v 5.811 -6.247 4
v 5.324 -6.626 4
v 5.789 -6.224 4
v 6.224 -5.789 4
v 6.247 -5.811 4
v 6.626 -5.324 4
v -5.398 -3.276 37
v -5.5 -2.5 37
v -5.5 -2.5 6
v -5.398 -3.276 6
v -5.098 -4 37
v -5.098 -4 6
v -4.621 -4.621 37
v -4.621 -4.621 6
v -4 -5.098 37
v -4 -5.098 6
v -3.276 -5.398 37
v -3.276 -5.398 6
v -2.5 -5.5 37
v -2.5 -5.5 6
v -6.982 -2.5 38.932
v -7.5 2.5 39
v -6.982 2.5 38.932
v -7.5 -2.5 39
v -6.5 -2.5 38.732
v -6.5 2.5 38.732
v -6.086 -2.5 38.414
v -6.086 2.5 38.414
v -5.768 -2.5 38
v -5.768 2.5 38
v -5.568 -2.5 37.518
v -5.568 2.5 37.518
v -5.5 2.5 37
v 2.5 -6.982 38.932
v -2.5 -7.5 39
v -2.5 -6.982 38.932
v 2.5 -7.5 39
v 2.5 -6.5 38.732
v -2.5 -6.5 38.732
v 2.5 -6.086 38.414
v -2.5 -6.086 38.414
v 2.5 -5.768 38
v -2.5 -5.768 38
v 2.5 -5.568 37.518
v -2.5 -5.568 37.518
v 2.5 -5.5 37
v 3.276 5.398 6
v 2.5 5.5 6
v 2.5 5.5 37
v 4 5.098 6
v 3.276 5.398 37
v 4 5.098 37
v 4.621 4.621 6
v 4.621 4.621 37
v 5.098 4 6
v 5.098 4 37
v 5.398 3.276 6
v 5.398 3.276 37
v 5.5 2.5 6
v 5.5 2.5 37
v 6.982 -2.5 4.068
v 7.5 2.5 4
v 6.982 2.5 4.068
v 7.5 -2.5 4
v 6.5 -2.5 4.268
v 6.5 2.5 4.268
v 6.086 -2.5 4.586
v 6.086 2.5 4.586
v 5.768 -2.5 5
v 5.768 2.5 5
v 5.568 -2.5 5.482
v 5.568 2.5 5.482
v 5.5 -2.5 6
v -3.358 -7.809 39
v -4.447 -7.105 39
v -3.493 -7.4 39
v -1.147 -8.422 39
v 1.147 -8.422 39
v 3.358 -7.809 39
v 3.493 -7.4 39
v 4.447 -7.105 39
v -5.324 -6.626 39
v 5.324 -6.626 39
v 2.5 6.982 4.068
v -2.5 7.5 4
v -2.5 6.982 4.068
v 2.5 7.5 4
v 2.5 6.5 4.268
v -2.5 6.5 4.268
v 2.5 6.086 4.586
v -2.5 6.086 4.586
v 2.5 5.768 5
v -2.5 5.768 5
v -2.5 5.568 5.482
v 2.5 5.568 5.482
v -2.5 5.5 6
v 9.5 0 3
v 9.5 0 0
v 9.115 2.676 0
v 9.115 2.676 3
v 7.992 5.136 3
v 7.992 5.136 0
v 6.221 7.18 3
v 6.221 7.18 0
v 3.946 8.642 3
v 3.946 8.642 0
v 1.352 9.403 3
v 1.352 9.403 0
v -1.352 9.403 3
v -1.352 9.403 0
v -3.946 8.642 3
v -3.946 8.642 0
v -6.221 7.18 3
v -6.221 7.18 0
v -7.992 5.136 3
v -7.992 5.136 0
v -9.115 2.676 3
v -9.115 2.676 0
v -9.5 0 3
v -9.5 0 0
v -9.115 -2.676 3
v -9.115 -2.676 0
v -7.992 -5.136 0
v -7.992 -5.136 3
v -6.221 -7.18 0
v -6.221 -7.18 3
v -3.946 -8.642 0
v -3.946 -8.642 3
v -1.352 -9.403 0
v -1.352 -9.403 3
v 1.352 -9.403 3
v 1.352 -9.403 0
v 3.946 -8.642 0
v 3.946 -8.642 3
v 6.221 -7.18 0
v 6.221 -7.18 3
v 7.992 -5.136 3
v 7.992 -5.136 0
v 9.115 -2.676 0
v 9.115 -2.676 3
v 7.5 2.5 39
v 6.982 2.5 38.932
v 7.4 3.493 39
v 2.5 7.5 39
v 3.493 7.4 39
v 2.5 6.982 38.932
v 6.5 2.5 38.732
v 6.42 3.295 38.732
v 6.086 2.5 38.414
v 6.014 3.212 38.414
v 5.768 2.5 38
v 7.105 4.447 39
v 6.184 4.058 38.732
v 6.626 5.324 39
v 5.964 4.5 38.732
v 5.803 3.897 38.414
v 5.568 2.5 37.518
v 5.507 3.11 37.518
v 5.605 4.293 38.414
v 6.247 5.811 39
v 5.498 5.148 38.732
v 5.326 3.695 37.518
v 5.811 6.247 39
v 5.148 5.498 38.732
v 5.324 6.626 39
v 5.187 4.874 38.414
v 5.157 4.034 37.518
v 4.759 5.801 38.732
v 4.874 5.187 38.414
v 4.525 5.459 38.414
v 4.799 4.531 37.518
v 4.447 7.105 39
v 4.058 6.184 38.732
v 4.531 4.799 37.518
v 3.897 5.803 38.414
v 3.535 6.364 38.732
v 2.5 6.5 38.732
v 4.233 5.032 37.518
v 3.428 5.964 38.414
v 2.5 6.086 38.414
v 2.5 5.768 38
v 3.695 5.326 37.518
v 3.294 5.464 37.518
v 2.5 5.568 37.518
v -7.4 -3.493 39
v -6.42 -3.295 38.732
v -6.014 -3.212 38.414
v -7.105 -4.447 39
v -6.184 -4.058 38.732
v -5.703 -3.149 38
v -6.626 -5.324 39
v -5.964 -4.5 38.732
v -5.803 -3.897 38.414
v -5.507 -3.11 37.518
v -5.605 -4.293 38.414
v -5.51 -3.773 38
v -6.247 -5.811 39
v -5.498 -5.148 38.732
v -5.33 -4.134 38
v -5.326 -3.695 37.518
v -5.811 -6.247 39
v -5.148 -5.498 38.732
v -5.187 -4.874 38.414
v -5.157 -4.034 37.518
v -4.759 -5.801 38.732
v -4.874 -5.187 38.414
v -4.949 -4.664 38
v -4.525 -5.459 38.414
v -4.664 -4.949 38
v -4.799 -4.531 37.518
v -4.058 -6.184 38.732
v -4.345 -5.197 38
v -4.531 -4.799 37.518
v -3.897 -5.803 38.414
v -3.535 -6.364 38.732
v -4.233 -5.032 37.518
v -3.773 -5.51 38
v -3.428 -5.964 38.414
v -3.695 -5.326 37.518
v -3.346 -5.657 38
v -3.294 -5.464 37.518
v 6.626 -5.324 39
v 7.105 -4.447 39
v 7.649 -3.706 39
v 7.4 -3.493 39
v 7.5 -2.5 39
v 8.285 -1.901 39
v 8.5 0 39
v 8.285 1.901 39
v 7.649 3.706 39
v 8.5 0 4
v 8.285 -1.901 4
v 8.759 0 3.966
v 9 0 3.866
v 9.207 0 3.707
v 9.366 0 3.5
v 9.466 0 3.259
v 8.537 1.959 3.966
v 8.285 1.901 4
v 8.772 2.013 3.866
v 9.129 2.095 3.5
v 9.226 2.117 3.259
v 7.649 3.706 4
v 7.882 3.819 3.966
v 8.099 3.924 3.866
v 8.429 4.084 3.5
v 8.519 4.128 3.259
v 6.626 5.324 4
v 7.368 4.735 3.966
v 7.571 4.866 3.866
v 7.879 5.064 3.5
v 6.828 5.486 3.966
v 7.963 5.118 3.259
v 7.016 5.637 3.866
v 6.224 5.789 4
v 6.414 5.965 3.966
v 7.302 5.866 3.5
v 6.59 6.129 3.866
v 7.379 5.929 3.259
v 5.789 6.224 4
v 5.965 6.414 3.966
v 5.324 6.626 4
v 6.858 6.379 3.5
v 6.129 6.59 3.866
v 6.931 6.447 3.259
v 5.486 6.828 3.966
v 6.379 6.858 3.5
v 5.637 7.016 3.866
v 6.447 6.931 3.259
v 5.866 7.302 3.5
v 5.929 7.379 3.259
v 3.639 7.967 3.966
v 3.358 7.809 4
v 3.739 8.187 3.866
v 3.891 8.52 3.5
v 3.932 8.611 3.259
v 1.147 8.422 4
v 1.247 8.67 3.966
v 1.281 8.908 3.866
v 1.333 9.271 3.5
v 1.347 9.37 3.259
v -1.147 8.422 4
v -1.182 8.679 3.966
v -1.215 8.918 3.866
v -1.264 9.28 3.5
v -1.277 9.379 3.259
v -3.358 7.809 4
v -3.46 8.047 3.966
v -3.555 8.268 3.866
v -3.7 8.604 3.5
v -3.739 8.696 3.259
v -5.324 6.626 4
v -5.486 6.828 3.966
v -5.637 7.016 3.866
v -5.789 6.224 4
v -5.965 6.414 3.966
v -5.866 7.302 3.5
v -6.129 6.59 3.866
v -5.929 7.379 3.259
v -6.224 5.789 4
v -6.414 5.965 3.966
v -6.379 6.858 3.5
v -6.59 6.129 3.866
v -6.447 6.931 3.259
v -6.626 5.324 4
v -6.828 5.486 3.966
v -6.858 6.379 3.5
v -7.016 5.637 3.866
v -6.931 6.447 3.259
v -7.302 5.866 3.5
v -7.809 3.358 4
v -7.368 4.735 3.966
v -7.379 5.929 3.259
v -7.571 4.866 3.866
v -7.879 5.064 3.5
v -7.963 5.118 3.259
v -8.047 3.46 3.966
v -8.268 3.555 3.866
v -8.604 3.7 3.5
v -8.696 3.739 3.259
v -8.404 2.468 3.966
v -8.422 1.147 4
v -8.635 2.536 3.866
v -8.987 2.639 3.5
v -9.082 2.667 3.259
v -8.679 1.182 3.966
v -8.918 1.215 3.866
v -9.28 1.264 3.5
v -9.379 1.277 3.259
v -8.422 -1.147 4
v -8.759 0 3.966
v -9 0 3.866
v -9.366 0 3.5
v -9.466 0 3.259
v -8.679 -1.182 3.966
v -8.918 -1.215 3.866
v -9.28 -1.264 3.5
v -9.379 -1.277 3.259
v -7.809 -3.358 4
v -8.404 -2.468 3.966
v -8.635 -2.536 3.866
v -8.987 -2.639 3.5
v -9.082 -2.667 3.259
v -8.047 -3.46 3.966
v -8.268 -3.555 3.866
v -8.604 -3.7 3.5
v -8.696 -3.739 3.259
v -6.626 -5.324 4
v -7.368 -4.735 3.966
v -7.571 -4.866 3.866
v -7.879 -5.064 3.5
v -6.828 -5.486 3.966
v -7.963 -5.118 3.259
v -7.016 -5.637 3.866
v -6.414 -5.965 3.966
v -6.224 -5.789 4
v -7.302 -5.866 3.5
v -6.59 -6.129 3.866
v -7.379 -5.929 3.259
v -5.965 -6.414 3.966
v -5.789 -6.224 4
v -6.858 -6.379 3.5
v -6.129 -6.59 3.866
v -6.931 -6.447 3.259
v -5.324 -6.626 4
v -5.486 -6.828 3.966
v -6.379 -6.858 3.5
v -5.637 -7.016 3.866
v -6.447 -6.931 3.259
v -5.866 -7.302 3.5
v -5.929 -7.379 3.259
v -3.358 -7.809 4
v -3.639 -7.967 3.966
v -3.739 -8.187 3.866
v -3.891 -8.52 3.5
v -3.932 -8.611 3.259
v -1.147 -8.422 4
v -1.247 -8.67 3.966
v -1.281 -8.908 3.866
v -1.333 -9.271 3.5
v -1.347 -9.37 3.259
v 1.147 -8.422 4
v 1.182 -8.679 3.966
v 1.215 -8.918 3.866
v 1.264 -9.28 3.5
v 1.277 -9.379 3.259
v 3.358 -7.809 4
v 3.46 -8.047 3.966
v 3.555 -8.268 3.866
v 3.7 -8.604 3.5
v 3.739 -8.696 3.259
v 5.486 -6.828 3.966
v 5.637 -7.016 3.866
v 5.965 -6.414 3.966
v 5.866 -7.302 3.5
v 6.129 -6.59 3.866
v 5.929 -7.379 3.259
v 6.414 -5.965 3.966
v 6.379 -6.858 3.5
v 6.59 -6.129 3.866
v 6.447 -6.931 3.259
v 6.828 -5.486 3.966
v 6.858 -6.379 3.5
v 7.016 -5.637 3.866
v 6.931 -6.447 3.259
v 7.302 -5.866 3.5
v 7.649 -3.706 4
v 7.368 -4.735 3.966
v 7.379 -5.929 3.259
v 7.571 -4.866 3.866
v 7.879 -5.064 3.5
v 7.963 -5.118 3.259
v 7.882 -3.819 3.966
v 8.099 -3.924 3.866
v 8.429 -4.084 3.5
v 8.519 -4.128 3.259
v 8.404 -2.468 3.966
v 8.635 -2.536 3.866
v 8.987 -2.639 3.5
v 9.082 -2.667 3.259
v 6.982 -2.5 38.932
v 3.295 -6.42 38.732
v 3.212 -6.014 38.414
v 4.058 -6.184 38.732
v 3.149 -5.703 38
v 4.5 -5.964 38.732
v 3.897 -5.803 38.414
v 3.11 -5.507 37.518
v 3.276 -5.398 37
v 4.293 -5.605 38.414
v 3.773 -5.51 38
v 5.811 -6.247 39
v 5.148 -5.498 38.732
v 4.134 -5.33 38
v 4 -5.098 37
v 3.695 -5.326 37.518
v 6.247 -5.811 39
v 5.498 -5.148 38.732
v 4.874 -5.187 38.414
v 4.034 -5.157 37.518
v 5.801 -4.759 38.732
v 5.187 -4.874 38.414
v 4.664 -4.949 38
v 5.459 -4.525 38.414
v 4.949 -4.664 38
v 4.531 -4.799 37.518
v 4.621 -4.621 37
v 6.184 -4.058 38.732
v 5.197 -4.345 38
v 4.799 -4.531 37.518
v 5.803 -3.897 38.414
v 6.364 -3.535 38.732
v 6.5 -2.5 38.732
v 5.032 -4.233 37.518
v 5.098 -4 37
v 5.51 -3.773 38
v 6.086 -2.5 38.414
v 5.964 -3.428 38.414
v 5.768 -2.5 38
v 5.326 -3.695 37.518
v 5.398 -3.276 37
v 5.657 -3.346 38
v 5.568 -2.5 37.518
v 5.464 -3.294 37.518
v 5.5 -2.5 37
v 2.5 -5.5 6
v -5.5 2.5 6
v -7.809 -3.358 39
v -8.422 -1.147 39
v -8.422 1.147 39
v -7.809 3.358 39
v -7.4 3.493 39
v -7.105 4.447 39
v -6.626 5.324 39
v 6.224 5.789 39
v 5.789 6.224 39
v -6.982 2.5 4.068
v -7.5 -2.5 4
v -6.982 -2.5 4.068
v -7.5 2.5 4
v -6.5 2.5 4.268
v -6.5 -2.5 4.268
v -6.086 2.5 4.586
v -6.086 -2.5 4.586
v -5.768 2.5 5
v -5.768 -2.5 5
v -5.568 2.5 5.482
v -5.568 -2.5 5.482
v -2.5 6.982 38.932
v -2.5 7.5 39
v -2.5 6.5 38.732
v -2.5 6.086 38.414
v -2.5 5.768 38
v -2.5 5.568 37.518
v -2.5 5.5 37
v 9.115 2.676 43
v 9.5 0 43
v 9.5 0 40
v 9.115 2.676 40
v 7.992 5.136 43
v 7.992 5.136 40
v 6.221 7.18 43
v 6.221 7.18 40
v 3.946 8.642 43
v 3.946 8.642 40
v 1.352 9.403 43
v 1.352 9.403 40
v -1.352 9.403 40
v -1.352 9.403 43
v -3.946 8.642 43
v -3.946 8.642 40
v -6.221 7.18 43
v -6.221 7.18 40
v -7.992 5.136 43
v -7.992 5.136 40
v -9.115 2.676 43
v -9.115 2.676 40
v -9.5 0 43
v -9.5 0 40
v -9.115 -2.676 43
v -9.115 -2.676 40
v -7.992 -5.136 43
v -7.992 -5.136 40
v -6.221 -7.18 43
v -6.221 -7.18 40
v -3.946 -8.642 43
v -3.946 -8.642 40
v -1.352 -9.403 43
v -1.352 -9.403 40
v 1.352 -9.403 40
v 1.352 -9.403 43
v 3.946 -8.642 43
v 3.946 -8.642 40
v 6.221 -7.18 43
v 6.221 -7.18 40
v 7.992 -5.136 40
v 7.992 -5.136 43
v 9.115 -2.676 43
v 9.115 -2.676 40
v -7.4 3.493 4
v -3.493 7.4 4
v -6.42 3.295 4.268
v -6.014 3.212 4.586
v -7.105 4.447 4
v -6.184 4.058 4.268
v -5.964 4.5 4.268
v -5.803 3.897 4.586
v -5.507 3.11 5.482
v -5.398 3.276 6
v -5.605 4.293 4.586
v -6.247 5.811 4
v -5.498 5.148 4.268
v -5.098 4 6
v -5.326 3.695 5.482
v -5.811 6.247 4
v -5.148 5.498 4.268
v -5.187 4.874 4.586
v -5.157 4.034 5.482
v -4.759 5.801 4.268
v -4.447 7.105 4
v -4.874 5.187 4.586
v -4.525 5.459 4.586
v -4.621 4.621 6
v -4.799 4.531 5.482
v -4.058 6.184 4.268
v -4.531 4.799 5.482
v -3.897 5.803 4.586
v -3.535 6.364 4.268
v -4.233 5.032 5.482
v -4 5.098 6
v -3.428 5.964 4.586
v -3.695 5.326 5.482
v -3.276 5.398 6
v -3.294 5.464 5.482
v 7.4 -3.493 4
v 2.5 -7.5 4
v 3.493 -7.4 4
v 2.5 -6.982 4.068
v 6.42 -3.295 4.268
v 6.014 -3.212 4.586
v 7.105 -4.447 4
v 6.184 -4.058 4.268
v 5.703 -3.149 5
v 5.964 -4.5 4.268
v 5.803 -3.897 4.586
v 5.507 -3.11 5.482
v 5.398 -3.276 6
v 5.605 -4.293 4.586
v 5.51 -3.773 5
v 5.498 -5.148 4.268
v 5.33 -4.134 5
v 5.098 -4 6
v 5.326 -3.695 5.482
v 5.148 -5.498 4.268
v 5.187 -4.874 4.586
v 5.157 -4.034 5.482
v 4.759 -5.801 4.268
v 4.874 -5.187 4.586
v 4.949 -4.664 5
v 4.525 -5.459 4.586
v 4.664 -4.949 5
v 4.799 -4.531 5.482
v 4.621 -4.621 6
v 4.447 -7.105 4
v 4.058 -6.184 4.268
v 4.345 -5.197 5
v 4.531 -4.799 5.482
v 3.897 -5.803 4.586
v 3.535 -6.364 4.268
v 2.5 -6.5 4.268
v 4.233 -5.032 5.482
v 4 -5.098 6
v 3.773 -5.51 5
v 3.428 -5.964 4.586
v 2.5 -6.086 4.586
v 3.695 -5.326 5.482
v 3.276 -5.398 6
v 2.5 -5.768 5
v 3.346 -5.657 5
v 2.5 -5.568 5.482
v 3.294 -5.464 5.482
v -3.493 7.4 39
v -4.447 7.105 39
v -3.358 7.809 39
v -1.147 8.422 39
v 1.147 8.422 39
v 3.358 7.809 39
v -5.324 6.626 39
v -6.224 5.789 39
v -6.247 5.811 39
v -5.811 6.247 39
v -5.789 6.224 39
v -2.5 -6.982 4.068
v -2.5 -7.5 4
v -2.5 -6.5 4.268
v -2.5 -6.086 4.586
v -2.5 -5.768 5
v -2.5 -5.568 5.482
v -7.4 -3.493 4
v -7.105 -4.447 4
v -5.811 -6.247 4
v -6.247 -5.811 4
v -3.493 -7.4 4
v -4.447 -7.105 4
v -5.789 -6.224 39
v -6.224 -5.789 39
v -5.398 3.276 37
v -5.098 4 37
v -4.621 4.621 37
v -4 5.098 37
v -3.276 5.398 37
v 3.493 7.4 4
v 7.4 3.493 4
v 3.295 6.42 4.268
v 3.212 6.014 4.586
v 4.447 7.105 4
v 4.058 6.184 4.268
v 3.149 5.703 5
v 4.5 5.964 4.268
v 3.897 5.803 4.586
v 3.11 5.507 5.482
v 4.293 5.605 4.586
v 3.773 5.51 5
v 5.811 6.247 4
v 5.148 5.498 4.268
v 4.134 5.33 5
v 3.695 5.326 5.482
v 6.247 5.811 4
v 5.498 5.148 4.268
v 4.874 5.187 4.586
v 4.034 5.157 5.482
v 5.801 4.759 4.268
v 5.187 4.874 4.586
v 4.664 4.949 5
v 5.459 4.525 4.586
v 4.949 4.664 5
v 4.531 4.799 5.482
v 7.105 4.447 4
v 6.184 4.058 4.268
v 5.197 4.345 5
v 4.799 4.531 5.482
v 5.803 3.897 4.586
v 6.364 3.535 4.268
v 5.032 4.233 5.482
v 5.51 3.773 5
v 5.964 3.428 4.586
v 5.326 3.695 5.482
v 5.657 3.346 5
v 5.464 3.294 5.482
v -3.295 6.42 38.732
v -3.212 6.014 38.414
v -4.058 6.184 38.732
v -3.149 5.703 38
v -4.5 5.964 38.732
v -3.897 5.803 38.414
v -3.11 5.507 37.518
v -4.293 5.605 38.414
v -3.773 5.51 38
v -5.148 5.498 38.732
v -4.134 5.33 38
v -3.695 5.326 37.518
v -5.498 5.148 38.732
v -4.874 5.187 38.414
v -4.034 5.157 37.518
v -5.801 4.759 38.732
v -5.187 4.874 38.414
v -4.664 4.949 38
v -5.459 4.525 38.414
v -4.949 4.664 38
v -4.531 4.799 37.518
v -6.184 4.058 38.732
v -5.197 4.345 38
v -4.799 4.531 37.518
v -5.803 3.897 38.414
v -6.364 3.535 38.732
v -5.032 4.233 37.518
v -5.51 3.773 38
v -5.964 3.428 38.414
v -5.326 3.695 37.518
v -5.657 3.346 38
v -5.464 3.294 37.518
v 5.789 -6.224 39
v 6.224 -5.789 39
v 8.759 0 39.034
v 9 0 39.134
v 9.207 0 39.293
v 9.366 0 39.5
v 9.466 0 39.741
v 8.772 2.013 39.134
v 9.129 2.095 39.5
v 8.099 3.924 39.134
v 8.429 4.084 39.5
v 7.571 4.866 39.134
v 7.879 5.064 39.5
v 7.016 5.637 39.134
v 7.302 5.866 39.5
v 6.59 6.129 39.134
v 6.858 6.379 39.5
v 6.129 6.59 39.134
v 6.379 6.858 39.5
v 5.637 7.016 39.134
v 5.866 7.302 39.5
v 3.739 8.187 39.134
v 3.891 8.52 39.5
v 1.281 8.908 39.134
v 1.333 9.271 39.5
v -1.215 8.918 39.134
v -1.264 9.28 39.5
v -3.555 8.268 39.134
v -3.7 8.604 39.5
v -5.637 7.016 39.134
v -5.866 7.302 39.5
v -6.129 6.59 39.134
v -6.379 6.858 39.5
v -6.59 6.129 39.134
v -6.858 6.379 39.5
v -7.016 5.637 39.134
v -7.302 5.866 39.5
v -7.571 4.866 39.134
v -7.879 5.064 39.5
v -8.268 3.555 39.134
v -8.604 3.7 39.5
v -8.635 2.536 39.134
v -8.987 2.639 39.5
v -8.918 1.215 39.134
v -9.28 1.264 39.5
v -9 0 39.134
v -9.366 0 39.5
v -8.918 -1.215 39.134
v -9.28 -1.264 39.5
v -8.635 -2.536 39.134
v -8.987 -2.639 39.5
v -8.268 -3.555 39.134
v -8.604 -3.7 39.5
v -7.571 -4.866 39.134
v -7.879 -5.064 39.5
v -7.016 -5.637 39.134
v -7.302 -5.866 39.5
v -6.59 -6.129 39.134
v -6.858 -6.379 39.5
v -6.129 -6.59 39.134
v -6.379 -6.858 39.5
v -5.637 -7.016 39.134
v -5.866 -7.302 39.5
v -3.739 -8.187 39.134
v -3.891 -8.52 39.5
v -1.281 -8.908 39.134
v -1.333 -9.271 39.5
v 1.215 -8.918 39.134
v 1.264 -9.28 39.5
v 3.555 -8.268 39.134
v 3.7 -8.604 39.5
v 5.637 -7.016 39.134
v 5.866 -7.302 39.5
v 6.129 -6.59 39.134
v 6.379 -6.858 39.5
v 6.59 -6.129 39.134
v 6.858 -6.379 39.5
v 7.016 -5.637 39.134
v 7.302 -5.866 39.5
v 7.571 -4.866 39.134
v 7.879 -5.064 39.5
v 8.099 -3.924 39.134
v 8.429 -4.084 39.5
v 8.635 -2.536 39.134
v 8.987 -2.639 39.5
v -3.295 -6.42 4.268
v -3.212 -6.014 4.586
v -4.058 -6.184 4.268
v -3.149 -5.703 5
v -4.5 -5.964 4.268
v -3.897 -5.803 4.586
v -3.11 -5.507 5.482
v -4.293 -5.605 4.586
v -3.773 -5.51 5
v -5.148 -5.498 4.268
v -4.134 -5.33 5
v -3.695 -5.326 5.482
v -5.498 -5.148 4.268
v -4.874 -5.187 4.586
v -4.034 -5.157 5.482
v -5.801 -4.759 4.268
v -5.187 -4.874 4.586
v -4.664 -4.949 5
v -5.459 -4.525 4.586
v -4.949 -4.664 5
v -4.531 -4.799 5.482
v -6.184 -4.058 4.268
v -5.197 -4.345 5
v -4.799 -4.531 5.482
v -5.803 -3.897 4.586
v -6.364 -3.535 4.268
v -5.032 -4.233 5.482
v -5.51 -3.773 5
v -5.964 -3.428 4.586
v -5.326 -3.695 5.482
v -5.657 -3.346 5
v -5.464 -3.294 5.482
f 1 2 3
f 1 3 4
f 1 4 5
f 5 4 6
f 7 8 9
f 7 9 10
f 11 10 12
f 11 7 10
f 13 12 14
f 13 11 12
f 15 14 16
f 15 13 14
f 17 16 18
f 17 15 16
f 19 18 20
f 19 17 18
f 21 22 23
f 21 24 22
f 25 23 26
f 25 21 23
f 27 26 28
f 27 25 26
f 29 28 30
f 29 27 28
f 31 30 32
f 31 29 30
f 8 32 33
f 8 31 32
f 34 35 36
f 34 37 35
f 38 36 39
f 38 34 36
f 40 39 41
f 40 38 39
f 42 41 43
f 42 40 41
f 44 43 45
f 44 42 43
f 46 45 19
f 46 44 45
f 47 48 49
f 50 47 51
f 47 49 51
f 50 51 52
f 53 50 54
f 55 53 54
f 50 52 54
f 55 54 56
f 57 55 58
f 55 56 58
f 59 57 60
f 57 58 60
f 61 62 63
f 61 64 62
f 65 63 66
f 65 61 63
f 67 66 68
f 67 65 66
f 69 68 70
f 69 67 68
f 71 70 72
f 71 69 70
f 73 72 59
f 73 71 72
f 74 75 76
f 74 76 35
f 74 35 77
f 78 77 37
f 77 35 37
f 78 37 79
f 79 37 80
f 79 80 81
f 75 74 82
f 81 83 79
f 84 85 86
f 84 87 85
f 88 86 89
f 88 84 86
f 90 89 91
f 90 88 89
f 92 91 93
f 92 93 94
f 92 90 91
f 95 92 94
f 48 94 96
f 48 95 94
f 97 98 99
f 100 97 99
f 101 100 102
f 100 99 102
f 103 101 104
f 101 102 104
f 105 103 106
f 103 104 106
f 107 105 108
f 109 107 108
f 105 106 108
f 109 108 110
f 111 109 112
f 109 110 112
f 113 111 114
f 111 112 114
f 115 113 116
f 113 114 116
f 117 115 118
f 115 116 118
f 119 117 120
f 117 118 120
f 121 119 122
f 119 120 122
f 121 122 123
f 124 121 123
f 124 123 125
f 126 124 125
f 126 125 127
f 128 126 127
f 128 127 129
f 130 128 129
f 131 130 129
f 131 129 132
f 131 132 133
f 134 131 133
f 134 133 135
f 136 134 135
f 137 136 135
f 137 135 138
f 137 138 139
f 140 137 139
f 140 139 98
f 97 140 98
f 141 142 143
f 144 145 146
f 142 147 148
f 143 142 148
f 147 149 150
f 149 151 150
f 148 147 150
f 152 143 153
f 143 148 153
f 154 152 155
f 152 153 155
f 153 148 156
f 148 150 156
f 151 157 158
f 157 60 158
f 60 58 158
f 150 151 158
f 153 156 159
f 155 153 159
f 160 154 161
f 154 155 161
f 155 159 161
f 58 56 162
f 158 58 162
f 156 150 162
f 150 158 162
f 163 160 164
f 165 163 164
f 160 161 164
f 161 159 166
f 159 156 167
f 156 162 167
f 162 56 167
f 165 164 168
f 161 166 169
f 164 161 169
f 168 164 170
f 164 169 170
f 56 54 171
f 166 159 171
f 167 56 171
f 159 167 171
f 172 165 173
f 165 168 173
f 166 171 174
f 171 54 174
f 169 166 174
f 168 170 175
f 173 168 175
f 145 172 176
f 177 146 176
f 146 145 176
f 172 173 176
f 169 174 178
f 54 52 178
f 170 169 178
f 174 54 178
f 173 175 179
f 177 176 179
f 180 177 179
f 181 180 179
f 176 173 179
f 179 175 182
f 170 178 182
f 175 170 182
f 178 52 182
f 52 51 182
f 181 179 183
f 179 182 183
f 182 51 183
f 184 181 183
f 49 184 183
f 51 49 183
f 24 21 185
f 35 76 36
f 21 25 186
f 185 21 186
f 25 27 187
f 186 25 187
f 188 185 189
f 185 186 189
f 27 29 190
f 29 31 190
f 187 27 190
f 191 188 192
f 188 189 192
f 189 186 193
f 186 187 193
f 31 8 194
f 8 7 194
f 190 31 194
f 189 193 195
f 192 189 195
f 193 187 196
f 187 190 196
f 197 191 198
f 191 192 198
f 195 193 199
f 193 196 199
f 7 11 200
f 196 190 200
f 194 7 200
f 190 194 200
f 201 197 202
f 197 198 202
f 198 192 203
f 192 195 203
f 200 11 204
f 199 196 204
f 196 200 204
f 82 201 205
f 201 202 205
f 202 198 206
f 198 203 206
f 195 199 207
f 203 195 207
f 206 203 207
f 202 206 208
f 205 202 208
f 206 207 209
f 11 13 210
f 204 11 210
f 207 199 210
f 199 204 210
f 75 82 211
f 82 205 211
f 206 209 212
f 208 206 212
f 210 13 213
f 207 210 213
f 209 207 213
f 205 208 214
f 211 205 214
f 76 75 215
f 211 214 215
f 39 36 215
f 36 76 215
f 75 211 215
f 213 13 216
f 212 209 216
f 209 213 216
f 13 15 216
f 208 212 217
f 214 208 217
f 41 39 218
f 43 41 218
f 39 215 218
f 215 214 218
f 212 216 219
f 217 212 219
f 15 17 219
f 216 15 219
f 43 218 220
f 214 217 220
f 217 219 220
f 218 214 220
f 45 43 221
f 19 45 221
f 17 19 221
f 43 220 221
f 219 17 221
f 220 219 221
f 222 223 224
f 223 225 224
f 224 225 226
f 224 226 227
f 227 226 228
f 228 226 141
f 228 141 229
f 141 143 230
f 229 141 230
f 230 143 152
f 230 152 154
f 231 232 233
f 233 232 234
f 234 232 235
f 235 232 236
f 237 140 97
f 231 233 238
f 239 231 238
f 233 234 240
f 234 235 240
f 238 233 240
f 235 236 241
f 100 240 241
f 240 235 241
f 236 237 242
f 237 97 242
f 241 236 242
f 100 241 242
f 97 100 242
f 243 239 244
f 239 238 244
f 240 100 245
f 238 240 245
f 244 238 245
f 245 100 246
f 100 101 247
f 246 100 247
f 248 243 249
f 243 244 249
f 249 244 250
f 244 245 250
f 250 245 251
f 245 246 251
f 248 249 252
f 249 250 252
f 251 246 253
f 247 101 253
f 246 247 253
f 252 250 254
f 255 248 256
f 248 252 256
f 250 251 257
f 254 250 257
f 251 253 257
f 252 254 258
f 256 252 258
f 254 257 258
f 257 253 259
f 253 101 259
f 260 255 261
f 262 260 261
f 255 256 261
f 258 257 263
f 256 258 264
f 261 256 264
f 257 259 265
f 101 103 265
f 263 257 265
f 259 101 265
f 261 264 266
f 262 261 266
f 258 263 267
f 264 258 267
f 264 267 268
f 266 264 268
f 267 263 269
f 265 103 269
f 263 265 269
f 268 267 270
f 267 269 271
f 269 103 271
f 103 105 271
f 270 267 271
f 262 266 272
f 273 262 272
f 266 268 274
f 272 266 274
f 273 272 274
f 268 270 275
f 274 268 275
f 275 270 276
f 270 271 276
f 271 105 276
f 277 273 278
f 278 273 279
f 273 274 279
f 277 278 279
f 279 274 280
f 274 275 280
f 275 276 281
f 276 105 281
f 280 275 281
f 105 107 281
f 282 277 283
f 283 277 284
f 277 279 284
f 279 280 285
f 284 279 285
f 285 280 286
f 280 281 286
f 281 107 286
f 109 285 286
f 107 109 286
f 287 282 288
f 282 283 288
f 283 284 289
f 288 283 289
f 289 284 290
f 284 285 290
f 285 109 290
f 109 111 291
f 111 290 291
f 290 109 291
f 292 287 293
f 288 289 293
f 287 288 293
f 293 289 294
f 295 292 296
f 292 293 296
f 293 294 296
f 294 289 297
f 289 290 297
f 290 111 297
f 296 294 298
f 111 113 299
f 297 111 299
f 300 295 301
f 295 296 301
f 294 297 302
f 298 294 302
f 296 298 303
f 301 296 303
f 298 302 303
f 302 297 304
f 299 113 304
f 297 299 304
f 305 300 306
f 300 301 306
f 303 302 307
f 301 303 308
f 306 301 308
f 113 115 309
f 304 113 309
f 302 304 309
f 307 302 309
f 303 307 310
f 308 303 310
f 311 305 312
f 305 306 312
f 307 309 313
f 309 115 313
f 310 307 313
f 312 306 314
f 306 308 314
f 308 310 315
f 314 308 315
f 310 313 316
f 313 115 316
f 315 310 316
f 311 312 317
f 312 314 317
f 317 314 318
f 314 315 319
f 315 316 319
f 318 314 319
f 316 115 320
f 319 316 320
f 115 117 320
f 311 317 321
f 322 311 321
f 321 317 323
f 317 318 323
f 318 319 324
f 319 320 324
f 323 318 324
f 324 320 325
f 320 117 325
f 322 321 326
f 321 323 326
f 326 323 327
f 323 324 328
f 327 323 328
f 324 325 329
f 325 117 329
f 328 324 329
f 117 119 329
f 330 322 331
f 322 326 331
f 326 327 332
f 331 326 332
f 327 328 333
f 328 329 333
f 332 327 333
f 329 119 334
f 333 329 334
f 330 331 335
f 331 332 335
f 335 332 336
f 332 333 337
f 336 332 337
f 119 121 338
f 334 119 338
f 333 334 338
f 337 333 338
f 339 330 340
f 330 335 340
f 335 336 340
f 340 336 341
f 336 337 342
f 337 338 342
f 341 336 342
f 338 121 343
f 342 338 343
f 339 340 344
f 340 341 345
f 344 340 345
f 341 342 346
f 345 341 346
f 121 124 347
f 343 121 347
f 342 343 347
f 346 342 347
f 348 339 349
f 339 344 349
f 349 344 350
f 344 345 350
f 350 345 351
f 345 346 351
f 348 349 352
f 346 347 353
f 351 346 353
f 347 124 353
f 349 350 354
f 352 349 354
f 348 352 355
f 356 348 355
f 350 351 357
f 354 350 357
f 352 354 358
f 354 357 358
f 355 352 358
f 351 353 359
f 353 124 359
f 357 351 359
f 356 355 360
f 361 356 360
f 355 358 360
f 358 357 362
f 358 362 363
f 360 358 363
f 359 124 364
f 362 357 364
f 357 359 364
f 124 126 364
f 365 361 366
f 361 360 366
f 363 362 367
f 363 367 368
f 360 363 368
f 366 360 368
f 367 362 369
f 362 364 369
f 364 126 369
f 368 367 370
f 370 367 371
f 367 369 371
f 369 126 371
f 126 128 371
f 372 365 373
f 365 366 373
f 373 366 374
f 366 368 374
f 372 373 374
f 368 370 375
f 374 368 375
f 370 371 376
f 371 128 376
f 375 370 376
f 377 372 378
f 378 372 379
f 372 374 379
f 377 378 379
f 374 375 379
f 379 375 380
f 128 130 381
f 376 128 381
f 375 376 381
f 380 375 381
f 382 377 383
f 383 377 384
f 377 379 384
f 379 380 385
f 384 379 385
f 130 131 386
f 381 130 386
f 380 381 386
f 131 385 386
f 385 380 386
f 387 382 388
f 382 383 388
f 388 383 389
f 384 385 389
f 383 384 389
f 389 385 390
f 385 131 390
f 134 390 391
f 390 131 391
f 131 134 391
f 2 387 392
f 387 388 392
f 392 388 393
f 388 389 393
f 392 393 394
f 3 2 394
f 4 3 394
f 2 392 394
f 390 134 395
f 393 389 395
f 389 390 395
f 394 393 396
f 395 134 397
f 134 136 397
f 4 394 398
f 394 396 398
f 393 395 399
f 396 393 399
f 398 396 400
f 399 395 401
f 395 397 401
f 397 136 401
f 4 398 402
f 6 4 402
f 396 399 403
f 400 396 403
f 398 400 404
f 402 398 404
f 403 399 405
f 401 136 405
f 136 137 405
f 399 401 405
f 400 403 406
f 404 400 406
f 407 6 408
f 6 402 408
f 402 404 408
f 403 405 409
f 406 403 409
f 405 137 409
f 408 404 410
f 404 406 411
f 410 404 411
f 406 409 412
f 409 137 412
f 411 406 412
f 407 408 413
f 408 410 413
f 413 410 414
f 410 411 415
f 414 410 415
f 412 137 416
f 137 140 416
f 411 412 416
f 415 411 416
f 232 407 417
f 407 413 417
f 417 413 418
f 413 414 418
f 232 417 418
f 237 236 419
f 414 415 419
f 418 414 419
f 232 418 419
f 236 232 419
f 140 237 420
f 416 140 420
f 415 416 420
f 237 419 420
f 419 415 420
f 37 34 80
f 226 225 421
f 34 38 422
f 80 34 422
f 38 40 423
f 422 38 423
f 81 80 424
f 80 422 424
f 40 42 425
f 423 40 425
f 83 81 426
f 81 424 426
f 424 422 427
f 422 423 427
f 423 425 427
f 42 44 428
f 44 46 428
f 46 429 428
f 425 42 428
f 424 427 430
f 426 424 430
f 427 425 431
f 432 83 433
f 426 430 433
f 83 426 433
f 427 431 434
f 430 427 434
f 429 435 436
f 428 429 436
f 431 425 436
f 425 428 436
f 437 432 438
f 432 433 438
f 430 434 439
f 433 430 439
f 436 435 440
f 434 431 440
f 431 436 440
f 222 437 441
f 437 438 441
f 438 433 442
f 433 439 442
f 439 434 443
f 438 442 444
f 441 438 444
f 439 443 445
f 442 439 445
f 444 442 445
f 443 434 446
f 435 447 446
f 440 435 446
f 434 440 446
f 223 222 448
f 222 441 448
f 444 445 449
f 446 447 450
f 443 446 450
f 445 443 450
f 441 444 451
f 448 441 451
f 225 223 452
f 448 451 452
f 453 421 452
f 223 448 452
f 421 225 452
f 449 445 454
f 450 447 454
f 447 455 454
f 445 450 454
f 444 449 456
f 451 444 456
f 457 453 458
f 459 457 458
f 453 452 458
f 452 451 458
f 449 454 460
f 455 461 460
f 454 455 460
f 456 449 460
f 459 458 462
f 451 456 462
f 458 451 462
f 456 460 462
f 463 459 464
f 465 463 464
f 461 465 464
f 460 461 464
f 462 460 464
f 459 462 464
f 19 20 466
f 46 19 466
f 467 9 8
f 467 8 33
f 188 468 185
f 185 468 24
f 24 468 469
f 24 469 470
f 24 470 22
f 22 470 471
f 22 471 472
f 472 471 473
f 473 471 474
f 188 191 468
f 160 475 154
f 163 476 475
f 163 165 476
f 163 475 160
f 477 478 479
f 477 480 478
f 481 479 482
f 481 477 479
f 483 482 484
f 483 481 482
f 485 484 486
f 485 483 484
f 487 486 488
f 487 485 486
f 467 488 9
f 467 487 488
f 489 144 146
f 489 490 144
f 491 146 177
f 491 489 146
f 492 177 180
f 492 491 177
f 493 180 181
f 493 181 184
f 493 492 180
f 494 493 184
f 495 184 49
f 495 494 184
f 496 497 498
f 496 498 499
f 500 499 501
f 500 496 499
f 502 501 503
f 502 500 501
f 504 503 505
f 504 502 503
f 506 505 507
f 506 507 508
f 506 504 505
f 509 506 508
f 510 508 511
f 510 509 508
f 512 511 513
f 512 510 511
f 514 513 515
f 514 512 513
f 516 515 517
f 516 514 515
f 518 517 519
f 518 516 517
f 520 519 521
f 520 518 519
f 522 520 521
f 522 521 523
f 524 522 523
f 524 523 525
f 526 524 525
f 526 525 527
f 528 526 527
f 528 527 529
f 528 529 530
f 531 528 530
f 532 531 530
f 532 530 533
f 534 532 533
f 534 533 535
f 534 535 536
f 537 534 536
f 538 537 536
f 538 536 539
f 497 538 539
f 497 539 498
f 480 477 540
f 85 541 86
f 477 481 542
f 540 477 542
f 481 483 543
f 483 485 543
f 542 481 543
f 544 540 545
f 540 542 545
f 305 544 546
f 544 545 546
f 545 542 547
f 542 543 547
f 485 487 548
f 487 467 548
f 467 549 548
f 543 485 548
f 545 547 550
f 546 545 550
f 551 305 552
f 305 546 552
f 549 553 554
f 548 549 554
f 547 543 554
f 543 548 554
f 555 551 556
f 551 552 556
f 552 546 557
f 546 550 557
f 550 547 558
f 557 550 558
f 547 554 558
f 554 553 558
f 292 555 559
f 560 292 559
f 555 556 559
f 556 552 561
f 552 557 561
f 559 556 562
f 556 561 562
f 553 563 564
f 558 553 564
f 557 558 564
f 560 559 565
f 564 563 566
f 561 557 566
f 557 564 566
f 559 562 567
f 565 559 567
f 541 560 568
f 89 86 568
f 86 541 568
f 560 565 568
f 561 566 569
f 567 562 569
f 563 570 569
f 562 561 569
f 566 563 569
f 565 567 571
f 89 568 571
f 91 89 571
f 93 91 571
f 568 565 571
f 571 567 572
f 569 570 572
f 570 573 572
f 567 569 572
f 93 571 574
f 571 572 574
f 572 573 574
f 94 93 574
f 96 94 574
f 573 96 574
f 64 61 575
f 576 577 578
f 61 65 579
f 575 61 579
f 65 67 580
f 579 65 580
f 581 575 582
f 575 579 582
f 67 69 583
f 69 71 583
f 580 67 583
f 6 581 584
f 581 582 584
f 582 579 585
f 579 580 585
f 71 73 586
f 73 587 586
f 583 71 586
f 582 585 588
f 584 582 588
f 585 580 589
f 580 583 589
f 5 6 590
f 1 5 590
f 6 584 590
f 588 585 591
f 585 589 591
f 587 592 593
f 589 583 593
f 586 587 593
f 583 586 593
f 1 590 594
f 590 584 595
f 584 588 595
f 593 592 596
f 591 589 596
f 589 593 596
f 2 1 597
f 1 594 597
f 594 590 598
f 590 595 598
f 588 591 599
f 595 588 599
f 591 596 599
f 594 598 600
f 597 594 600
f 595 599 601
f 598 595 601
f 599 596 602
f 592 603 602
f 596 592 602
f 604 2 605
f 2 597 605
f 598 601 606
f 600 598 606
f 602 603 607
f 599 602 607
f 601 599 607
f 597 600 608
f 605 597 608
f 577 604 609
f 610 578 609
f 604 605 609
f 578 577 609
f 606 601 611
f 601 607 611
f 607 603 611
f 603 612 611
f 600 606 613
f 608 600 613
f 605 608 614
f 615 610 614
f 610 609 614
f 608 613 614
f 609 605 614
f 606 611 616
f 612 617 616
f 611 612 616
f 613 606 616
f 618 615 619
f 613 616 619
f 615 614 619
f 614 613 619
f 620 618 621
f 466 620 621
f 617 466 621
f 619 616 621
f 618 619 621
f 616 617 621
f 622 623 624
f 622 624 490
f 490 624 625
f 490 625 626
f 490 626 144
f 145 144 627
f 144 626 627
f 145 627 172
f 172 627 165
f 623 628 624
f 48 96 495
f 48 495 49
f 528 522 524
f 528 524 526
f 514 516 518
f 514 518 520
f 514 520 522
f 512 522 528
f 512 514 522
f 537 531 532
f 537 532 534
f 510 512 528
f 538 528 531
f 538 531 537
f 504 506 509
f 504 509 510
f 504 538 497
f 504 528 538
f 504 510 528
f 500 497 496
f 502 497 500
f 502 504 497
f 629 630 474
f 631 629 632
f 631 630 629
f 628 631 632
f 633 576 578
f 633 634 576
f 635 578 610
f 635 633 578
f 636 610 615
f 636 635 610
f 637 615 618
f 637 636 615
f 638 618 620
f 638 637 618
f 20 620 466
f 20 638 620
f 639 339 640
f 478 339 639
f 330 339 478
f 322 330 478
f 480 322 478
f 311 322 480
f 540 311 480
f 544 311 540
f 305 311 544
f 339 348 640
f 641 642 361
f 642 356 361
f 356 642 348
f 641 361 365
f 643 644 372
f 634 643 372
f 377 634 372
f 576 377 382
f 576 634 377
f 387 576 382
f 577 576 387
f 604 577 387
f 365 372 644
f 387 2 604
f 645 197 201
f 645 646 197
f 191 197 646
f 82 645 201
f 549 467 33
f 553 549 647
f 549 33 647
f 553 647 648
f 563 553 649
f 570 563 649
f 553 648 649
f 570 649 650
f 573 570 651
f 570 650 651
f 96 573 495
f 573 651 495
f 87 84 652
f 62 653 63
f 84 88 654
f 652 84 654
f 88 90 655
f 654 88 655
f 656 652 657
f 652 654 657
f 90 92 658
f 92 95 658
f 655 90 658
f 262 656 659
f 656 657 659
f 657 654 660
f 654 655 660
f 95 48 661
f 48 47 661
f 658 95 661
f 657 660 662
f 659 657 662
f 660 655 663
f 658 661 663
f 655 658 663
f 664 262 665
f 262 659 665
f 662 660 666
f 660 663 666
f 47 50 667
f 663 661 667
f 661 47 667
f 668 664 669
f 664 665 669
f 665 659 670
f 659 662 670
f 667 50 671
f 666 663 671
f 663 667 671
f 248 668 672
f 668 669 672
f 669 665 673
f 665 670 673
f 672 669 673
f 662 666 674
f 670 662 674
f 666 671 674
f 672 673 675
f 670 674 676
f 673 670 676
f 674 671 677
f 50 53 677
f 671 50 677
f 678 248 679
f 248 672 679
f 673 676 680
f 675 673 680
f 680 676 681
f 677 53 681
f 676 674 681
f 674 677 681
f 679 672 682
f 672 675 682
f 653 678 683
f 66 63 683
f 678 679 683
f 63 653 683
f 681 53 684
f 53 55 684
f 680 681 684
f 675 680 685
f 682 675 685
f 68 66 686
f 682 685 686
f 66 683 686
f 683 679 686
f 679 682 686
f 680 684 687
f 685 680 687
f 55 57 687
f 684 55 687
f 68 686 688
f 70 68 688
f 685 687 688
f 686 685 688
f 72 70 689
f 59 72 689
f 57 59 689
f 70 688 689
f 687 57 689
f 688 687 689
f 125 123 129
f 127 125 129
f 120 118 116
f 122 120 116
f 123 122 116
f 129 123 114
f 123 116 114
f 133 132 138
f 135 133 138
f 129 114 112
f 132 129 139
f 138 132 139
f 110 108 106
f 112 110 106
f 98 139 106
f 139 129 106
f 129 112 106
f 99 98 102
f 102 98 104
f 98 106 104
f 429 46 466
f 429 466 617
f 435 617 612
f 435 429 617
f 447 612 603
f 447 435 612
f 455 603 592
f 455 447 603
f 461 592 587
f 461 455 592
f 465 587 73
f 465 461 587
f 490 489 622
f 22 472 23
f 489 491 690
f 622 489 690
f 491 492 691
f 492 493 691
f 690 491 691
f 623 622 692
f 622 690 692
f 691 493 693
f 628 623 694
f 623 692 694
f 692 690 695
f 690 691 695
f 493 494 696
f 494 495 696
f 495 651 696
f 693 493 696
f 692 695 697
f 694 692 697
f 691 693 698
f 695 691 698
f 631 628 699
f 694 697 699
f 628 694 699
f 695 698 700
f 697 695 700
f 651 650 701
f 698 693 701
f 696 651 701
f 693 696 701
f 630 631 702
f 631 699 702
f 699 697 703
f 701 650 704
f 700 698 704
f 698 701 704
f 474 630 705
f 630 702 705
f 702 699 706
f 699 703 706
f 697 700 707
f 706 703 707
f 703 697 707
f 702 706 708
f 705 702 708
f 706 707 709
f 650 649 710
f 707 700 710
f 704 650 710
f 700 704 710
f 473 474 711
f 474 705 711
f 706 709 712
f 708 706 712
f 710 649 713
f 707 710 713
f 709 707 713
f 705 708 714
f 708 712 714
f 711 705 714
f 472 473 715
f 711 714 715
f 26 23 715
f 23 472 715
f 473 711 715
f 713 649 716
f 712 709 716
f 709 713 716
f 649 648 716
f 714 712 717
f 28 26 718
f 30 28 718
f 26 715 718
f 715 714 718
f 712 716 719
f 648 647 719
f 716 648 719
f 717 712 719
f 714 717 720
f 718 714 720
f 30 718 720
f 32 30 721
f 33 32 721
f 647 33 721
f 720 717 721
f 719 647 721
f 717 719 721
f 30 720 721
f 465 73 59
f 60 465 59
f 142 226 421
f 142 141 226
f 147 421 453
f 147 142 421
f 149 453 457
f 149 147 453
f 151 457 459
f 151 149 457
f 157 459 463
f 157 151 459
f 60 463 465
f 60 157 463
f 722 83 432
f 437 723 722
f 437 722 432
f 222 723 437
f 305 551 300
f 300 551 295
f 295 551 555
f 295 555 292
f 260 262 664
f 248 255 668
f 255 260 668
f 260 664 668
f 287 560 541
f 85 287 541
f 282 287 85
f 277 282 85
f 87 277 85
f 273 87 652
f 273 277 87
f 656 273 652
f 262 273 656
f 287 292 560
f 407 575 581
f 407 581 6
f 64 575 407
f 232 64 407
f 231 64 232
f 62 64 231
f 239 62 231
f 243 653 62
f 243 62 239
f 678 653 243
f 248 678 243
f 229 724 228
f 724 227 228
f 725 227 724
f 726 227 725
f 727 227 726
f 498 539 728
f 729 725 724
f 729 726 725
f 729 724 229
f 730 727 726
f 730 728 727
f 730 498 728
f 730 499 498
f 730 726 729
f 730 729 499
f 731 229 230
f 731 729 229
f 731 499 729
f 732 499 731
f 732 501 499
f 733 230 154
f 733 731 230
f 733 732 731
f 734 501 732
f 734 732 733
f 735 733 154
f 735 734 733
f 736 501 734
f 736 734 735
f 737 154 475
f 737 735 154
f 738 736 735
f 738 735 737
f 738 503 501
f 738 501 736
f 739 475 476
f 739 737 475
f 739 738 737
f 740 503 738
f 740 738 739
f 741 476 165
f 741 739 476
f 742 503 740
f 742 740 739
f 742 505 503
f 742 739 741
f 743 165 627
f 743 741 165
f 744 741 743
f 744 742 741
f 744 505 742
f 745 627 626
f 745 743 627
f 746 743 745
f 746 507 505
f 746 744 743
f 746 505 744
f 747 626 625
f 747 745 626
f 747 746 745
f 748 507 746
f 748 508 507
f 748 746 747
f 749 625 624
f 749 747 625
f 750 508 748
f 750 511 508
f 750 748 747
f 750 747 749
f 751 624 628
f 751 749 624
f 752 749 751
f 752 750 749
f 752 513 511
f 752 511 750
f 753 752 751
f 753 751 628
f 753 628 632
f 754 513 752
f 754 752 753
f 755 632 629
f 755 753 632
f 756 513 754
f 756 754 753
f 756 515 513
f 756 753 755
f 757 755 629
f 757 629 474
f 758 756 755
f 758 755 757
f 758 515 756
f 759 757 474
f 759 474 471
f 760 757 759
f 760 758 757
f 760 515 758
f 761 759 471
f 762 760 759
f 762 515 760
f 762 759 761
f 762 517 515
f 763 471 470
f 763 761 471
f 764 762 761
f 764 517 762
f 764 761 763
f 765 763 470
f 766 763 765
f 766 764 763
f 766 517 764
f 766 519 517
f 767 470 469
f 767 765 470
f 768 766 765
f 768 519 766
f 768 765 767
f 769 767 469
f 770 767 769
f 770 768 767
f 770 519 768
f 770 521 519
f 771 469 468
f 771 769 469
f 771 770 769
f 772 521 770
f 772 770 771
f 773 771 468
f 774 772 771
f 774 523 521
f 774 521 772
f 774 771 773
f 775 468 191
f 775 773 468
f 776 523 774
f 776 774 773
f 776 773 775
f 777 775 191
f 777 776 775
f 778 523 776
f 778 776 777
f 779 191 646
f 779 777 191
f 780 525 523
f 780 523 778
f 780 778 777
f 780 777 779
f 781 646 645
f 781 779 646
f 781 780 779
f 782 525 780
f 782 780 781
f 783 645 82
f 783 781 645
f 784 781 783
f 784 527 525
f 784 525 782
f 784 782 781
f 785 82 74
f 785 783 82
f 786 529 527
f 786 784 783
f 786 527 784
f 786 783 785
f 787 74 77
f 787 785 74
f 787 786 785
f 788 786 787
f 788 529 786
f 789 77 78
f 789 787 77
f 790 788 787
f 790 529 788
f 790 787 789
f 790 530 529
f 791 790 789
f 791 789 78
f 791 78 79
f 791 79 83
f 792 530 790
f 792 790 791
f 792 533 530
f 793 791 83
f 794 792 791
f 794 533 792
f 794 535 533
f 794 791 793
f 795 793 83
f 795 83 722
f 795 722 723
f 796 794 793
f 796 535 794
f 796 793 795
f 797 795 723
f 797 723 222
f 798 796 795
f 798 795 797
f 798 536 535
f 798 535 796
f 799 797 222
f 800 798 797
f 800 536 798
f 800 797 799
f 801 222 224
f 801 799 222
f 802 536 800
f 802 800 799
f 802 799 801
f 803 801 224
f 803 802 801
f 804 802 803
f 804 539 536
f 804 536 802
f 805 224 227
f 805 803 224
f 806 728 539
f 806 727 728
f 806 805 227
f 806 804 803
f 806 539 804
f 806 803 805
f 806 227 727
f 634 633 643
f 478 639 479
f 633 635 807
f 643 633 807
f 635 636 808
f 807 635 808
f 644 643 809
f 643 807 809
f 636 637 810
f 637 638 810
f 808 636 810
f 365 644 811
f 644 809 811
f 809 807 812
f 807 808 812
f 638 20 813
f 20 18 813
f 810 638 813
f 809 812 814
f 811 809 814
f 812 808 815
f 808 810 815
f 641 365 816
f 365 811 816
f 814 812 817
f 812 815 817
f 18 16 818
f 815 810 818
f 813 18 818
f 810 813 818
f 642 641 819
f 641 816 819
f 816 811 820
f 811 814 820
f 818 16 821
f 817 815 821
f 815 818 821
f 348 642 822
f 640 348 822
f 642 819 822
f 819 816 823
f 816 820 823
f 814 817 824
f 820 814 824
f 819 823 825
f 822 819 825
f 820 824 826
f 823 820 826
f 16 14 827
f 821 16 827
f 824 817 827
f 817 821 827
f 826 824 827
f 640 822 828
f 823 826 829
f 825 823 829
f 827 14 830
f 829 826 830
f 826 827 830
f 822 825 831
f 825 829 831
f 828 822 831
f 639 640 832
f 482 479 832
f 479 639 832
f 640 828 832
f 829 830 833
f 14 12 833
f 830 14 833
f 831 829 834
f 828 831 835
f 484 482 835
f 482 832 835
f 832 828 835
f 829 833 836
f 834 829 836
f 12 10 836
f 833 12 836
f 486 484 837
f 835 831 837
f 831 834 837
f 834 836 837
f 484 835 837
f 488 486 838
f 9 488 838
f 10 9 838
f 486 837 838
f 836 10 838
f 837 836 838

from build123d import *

# Parameters (mm, degrees)
F0_R     = 9.5
F1_DEPTH = 4
F2_W     = 11
F2_H     = 11
F3_DEPTH = 35
F6_R     = 3
F7_R     = 2


# Not quite as in the source:
# - a fillet or chamfer that OpenCascade refuses, or shapes differently, is made with other operations: its cross-section is extruded or revolved along the edge and cut away or added
# - a pattern or mirror of a feature is missing from the dataset's text; its kind, count and spacing are read off the source's solid


with BuildPart() as f1:
    # F0 (on Top) → F1 (new body)
    with BuildSketch(Plane.XY):
        Circle(F0_R)
    extrude(amount=F1_DEPTH)


with BuildPart() as f1_copies_1:
    # F1_copies: instance of F1
    add(f1.part.mirror(Plane.XY.offset(21.499996)))


with BuildPart() as f1_1:
    add(f1.part)

    add(f1_copies_1.part)  # F3 merges F1_copies_1
    # F2 (on face) → F3 (join)
    with BuildSketch(Plane.XY.offset(4)):
        Rectangle(F2_W, F2_H)
    extrude(amount=F3_DEPTH)

    # F6
    f6_edges = [f1_1.edges().sort_by_distance(p)[0] for p in [
        (5.5, -5.5, 21.499996),
        (5.5, 5.5, 21.499996),
        (-5.5, -5.5, 21.499996),
        (-5.5, 5.5, 21.499996),
    ]]
    fillet(f6_edges, radius=F6_R)

    # F7
    f7_edges = [f1_1.edges().sort_by_distance(p)[0] for p in [
        (0, 5.5, 4),
        (2.5, 5.5, 21.499996),
        (-2.5, 5.5, 21.499996),
        (0, 5.5, 38.999992),
        (4.62132, 4.62132, 4),
        (5.5, 0, 38.999992),
        (4.62132, 4.62132, 38.999992),
        (4.62132, -4.62132, 38.999992),
        (0, -5.5, 38.999992),
        (-4.62132, 4.62132, 38.999992),
        (-4.62132, -4.62132, 38.999992),
        (-5.5, 0, 38.999992),
        (5.5, 0, 4),
        (4.62132, -4.62132, 4),
        (0, -5.5, 4),
        (-4.62132, 4.62132, 4),
        (-4.62132, -4.62132, 4),
        (-5.5, 0, 4),
    ]]
    fillet(f7_edges, radius=F7_R)

    # F8: fillet of radius 1 on 2 edges, made by hand

    # F8_s1 → F8_t2 (revolve, cut)
    with BuildSketch(Plane.XZ):
        with BuildLine():
            ThreePointArc((8.5, 4), (9.2071067812, 3.7071067812), (9.5, 3))
            Line((9.5, 3), (9.5, 4))
            Line((9.5, 4), (8.5, 4))
        make_face()
    revolve(axis=Axis((0, 0, 4), (0, 0, 1)), mode=Mode.SUBTRACT)

    # F8_s3 → F8_t4 (revolve, cut)
    with BuildSketch(Plane.XZ):
        with BuildLine():
            ThreePointArc((8.5, 38.999992), (9.2071067812, 39.2928852188), (9.5, 39.999992))
            Line((9.5, 39.999992), (9.5, 38.999992))
            Line((9.5, 38.999992), (8.5, 38.999992))
        make_face()
    revolve(axis=Axis((0, 0, 38.999992), (0, 0, 1)), mode=Mode.SUBTRACT)


solid = f1_1.part
